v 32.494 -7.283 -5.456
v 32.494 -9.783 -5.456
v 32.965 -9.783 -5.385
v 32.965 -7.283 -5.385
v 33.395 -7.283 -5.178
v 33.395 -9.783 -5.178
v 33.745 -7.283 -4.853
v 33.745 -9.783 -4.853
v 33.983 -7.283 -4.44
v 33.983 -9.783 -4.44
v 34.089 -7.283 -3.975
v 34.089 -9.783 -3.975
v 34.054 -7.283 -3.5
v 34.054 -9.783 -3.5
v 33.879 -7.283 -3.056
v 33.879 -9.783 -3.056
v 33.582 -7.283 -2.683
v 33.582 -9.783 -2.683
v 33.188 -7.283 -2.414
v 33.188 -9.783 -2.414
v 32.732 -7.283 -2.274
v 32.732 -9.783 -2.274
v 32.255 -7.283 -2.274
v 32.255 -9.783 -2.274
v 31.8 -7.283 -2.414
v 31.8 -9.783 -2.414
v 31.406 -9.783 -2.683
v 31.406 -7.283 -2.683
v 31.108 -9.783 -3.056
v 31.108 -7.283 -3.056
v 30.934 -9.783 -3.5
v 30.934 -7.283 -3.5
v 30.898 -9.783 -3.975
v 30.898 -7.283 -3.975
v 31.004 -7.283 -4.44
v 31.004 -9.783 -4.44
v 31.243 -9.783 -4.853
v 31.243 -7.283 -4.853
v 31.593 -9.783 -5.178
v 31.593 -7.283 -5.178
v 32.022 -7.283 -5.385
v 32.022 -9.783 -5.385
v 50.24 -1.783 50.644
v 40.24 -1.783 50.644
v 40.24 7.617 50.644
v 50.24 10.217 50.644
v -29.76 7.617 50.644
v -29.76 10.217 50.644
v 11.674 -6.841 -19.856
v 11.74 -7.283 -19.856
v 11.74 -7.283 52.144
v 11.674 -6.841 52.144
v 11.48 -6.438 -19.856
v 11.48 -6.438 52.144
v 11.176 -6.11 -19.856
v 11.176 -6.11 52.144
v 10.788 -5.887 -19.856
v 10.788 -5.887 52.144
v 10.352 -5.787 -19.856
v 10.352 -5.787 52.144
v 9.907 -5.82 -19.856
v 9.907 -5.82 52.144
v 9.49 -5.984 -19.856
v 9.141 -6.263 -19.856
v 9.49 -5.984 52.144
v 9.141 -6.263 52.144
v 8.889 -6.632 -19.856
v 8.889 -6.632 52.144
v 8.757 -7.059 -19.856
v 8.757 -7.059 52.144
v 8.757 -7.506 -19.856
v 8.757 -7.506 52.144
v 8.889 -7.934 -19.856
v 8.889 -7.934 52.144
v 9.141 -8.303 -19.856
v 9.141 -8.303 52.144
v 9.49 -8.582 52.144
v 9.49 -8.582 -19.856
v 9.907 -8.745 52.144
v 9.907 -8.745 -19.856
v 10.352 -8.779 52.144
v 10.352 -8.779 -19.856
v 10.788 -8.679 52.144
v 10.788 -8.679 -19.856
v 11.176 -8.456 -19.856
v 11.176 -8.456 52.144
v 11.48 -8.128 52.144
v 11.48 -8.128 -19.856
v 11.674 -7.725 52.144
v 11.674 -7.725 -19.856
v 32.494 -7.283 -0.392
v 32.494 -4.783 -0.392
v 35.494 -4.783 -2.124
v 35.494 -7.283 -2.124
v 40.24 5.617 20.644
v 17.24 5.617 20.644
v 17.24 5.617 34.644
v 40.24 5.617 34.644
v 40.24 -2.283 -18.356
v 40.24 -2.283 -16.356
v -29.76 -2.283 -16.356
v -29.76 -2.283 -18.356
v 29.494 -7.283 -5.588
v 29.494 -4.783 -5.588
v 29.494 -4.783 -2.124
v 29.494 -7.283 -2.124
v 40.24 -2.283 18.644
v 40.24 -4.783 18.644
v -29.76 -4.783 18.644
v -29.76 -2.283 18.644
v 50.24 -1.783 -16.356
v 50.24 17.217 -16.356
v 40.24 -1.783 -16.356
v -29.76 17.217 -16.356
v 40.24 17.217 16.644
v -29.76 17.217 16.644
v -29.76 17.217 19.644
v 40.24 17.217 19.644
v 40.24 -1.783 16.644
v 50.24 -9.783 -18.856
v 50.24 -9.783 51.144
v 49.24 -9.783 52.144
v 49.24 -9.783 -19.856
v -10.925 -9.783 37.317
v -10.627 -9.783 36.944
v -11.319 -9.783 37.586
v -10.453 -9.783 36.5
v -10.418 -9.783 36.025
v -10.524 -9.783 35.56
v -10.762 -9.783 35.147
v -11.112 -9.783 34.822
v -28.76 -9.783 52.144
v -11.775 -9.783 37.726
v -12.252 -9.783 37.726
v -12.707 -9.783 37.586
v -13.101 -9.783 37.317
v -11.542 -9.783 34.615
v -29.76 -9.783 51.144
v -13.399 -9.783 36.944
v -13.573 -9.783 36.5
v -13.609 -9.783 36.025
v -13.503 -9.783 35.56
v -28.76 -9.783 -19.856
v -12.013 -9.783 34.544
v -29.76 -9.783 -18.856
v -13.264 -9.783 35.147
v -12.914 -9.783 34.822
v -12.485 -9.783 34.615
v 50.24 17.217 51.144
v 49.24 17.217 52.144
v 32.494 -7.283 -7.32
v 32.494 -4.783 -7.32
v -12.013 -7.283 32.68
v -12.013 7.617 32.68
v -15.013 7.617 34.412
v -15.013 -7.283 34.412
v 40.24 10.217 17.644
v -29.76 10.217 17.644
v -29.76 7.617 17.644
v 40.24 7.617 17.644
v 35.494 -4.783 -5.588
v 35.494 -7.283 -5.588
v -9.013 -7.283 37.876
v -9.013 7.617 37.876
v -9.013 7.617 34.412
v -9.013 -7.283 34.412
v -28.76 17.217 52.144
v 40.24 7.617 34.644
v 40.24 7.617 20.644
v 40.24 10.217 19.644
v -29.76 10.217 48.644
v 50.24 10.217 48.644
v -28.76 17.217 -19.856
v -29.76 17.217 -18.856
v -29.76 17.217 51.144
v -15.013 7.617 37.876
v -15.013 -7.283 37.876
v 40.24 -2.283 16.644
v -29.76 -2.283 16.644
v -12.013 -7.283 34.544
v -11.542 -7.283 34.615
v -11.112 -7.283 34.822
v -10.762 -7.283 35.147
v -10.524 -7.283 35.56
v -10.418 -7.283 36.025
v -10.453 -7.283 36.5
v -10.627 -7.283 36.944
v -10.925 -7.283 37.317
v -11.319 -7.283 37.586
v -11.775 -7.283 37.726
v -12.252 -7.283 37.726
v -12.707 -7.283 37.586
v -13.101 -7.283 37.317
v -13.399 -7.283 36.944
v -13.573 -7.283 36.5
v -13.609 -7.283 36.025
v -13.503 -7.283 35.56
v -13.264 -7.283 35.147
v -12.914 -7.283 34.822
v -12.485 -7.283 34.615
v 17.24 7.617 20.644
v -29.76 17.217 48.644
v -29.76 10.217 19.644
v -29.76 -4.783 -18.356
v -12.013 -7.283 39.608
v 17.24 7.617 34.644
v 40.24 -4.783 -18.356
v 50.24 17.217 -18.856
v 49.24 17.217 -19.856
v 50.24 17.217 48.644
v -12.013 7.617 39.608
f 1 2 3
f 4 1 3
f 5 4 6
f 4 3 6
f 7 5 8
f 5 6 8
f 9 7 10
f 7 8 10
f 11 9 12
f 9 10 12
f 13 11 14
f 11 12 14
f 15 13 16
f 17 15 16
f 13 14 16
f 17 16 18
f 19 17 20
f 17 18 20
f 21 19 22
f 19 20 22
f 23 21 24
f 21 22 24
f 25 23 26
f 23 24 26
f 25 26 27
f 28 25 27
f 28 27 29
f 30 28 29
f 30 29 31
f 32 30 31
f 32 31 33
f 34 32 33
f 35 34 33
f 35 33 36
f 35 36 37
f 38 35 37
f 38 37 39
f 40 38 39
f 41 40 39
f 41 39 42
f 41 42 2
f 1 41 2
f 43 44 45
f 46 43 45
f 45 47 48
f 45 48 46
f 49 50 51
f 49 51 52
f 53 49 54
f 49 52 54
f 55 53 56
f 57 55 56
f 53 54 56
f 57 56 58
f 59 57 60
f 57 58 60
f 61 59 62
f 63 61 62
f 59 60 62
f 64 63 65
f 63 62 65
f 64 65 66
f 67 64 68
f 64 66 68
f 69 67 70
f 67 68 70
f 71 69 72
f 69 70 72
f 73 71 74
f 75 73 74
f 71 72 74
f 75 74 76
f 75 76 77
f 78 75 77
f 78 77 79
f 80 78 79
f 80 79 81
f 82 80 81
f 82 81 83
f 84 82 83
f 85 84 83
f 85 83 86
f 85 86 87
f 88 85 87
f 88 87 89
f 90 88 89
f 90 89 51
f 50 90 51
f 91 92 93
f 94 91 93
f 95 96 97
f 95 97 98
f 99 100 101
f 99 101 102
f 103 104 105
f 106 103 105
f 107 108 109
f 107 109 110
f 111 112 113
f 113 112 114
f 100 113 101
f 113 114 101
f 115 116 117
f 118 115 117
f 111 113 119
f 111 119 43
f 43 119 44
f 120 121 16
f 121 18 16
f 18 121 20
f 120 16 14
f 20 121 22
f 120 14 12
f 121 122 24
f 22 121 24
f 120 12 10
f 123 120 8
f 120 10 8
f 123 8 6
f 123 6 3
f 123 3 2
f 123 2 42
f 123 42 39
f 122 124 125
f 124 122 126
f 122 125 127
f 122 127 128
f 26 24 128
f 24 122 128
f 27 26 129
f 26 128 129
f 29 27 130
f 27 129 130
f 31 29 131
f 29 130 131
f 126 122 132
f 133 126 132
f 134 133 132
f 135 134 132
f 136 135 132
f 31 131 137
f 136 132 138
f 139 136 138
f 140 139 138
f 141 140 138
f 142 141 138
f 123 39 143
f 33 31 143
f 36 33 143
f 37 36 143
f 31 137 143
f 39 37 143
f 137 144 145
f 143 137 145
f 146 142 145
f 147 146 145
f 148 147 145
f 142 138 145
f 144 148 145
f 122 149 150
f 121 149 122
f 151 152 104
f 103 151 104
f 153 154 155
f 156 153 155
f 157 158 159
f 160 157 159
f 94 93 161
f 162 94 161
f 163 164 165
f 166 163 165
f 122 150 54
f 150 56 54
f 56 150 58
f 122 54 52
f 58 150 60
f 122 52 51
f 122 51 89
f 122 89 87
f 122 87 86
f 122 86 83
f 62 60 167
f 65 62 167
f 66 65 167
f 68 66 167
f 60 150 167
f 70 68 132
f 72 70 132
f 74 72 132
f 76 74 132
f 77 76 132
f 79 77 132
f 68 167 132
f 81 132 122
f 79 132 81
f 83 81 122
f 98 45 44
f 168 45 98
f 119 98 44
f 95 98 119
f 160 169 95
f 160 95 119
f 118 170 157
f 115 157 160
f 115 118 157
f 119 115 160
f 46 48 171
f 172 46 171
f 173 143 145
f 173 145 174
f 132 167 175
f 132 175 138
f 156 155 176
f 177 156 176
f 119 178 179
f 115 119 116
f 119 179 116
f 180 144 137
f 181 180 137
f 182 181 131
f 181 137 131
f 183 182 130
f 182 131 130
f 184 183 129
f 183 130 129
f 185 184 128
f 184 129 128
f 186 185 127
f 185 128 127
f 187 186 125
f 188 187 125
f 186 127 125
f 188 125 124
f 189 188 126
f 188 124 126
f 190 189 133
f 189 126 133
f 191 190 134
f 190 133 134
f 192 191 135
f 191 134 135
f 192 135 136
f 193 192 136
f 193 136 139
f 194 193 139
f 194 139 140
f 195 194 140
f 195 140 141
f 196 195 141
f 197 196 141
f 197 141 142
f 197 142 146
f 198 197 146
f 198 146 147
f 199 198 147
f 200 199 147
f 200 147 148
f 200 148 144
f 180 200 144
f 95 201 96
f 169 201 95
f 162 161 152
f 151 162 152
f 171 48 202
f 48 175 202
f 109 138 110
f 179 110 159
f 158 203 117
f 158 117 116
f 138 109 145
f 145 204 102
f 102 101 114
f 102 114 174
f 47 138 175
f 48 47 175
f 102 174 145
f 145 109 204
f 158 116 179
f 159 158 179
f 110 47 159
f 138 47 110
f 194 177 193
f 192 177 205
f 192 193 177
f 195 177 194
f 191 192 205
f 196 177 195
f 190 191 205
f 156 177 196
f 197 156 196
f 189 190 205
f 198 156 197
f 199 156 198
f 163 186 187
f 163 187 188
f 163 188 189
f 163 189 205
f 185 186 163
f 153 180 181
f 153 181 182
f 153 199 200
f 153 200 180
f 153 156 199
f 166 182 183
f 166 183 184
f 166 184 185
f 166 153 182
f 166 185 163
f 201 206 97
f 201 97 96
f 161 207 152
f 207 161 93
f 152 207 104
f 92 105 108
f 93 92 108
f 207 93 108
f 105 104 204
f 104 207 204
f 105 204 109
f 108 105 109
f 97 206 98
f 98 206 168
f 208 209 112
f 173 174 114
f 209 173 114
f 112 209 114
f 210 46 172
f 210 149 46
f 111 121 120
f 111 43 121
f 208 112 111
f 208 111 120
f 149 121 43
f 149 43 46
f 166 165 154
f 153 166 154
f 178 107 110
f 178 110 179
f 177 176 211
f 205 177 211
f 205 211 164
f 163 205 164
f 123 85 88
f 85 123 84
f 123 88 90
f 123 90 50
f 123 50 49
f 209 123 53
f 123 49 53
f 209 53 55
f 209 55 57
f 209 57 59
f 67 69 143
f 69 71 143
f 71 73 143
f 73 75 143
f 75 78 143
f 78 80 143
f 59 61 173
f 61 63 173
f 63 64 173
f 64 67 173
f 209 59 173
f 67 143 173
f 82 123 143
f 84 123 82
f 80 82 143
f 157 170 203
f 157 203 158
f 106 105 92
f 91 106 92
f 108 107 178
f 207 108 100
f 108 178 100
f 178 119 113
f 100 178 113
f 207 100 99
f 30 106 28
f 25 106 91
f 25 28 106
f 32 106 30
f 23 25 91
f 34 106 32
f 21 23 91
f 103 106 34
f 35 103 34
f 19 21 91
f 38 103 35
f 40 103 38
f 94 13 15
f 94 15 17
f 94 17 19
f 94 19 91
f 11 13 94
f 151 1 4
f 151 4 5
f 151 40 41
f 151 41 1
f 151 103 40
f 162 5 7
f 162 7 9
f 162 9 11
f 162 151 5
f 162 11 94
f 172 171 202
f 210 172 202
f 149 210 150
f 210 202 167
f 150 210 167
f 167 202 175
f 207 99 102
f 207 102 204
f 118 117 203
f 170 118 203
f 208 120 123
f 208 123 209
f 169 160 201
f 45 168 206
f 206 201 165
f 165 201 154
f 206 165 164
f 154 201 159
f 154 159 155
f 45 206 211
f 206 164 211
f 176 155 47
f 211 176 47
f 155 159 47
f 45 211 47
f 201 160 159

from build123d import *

# Parameters (mm, degrees)
BOSS_EXTRUDE1_DEPTH  = 69.99986
SKETCH2_W            = 23
SKETCH2_H            = 14
CUT_EXTRUDE1_DEPTH   = 2
BOSS_EXTRUDE10_DEPTH = 10
CHAMFER2_SIZE        = 1
SKETCH10_R           = 1.5
CUT_EXTRUDE5_DEPTH   = 90.467972845
SKETCH11_R           = 1.6
CUT_EXTRUDE6_DEPTH   = 78.279501445
CUT_EXTRUDE7_DEPTH   = 14.9


with BuildPart() as part:
    # Sketch1 → Boss-Extrude1 (new body)
    with BuildSketch(Plane.ZY.offset(29.759563114)):
        Polygon((-16.355611523, -2.282836071), (-18.355611523, -2.282836071), (-18.355611523, -4.782836071), (18.644388477, -4.782836071), (18.644388477, -2.282836071), (16.644388477, -2.282836071), (16.644388477, 17.217163929), (19.644388477, 17.217163929), (19.644388477, 10.217163929), (17.644388477, 10.217163929), (17.644388477, 7.617163929), (50.644324477, 7.617163929), (50.644324477, 10.217163929), (48.644324477, 10.217163929), (48.644324477, 17.217163929), (52.144356477, 17.217163929), (52.144356477, -9.782836071), (-19.855643523, -9.782836071), (-19.855643523, 17.217163929), (-16.355611523, 17.217163929), align=None)
    extrude(amount=-BOSS_EXTRUDE1_DEPTH)

    # Sketch2 → Cut-Extrude1 (cut)
    with BuildSketch(Plane(origin=(0, 7.617163929, 0), x_dir=(1, 0, 0), z_dir=(0, 1, 0))):
        with Locations((28.740296886, -27.644388477)):
            Rectangle(SKETCH2_W, SKETCH2_H)
    extrude(amount=-CUT_EXTRUDE1_DEPTH, mode=Mode.SUBTRACT)

    # Sketch9 → Boss-Extrude10 (add)
    with BuildSketch(Plane(origin=(40.240296886, 0, 0), x_dir=(0, 0, -1), z_dir=(1, 0, 0))):
        Polygon((-48.644324477, 17.217163929), (-52.144356477, 17.217163929), (-52.144356477, -9.782836071), (19.855643523, -9.782836071), (19.855643523, 17.217163929), (16.355611523, 17.217163929), (16.355611523, -1.782836071), (-50.644324477, -1.782836071), (-50.644324477, 10.217163929), (-48.644324477, 10.217163929), align=None)
    extrude(amount=BOSS_EXTRUDE10_DEPTH)

    # Chamfer2
    chamfer2_edges = [part.edges().sort_by_distance(p)[0] for p in [
        (-29.759563114, 3.717163929, -19.855643523),
        (-29.759563114, 3.717163929, 52.144356477),
        (50.240296886, 3.717163929, 52.144356477),
        (50.240296886, 3.717163929, -19.855643523),
    ]]
    chamfer(chamfer2_edges, length=CHAMFER2_SIZE)

    # Sketch10 → Cut-Extrude5 (cut, through all)
    with BuildSketch(Plane.XY.offset(52.144356477)):
        with Locations((10.240366886, -7.282836071)):
            Circle(SKETCH10_R)
    extrude(amount=-CUT_EXTRUDE5_DEPTH, mode=Mode.SUBTRACT)

    # Sketch11 → Cut-Extrude6 (cut, through all)
    with BuildSketch(Plane.XZ.offset(9.782836071)):
        with Locations(Location((-12.013114804, 36.144356477, 0), (0, 0, 270))):
            Circle(SKETCH11_R)
        with Locations(Location((32.493848577, -3.855643523, 0), (0, 0, 270))):
            Circle(SKETCH11_R)
    extrude(amount=-CUT_EXTRUDE6_DEPTH, mode=Mode.SUBTRACT)

    # Sketch12 → Cut-Extrude7 (cut)
    with BuildSketch(Plane(origin=(0, 7.617163929, 0), x_dir=(1, 0, 0), z_dir=(0, 1, 0))):
        Polygon((-12.013114804, -32.680254862), (-15.013114804, -34.412305669), (-15.013114804, -37.876407284), (-12.013114804, -39.608458092), (-9.013114804, -37.876407284), (-9.013114804, -34.412305669), align=None)
        Polygon((32.493848577, 7.319745138), (29.493848577, 5.587694331), (29.493848577, 2.123592716), (32.493848577, 0.391541908), (35.493848577, 2.123592716), (35.493848577, 5.587694331), align=None)
    extrude(amount=-CUT_EXTRUDE7_DEPTH, mode=Mode.SUBTRACT)


solid = part.part
